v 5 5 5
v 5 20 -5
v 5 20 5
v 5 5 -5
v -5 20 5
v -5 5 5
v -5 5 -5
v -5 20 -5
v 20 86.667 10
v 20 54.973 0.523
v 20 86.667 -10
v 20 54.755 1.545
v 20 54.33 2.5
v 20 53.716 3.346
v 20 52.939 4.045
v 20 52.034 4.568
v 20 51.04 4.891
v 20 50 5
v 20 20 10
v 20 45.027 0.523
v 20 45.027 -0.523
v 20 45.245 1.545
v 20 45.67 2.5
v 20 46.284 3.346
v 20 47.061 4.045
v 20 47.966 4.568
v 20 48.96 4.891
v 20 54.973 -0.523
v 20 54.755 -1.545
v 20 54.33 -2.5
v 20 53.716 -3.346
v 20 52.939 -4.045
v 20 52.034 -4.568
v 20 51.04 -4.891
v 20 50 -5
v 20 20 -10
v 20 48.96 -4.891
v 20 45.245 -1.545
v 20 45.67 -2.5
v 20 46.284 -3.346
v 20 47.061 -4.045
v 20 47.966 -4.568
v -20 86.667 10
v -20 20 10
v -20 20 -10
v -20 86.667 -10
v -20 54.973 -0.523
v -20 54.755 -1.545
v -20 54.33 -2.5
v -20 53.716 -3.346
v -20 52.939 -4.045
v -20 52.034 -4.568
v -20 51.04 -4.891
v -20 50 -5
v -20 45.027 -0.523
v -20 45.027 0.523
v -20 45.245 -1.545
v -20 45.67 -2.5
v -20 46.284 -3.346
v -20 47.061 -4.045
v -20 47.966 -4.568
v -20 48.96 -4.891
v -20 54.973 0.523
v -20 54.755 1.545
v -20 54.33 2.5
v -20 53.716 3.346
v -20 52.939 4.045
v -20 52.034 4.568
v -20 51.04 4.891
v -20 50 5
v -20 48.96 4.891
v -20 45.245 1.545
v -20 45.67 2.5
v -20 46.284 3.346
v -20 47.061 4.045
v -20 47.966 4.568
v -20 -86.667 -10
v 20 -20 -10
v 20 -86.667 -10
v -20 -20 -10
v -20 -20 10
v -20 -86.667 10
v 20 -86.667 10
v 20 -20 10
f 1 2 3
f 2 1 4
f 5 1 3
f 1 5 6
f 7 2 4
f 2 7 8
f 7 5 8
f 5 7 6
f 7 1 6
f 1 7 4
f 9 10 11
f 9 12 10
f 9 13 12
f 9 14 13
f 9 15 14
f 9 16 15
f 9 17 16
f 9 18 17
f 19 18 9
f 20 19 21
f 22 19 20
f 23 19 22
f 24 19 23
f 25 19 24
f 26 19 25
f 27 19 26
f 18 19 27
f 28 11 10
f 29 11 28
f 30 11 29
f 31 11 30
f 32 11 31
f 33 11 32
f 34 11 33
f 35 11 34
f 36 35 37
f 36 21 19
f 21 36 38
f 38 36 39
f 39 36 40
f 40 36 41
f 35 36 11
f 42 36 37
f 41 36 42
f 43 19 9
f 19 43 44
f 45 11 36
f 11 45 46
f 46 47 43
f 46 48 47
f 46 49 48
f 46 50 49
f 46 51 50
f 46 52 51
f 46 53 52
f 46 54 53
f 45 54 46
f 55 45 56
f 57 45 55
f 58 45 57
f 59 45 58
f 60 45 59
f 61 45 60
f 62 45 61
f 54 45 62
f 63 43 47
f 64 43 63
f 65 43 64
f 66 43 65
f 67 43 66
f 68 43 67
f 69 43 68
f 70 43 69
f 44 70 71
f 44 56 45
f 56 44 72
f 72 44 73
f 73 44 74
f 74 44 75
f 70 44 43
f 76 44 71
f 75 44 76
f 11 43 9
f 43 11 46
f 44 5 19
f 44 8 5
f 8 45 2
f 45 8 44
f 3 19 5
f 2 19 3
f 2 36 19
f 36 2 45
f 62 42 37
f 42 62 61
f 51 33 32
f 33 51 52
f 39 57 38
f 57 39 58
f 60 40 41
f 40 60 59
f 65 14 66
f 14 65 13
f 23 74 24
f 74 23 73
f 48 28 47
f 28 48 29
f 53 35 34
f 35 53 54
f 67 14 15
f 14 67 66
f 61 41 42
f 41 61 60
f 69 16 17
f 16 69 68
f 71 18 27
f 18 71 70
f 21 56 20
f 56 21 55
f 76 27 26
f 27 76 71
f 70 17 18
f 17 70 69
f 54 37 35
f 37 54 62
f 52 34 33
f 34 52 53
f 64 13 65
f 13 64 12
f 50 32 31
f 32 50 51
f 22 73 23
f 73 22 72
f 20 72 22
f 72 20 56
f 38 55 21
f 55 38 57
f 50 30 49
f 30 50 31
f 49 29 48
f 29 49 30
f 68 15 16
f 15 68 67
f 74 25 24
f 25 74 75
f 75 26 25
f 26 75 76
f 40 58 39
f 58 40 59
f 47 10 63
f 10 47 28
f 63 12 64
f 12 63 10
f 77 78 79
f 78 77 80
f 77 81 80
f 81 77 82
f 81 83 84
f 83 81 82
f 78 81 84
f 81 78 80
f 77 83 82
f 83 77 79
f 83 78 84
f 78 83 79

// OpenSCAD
$fs = 0.01;




height=20;
radius=10;
screw_diam=3;

cylinder_height=height/3;
laser_diameter=10;
laser_height=80;

laser_offset=100;


difference() {
translate([-height/4,5,-height/4])
//cylinder(h=cylinder_height,r1=radius,r2=radius);
cube(size=[height/2,20,height/2]);
    
    translate([0,-radius,-height/2])
    cylinder(h=height,r1=screw_diam/2,r2=screw_diam/2);
}


difference() {
    
translate([-height,20,-height/2])
cube(size=[2*height,laser_offset/1.5,height]);
    
rotate([0,90,0])
translate([0,laser_offset/2,0])
    cylinder(h=laser_height,r1=laser_diameter/2,r2=laser_diameter/2,center=true);
    
}

difference() {
    
    
translate([-height,-height,height/2])
rotate([180,0,0])
cube(size=[2*height,laser_offset/1.5,height]);
    
rotate([0,90,0])
translate([0,laser_offset/2,0])
    cylinder(h=laser_height,r1=laser_diameter/2,r2=laser_diameter/2,center=true);
    
}
